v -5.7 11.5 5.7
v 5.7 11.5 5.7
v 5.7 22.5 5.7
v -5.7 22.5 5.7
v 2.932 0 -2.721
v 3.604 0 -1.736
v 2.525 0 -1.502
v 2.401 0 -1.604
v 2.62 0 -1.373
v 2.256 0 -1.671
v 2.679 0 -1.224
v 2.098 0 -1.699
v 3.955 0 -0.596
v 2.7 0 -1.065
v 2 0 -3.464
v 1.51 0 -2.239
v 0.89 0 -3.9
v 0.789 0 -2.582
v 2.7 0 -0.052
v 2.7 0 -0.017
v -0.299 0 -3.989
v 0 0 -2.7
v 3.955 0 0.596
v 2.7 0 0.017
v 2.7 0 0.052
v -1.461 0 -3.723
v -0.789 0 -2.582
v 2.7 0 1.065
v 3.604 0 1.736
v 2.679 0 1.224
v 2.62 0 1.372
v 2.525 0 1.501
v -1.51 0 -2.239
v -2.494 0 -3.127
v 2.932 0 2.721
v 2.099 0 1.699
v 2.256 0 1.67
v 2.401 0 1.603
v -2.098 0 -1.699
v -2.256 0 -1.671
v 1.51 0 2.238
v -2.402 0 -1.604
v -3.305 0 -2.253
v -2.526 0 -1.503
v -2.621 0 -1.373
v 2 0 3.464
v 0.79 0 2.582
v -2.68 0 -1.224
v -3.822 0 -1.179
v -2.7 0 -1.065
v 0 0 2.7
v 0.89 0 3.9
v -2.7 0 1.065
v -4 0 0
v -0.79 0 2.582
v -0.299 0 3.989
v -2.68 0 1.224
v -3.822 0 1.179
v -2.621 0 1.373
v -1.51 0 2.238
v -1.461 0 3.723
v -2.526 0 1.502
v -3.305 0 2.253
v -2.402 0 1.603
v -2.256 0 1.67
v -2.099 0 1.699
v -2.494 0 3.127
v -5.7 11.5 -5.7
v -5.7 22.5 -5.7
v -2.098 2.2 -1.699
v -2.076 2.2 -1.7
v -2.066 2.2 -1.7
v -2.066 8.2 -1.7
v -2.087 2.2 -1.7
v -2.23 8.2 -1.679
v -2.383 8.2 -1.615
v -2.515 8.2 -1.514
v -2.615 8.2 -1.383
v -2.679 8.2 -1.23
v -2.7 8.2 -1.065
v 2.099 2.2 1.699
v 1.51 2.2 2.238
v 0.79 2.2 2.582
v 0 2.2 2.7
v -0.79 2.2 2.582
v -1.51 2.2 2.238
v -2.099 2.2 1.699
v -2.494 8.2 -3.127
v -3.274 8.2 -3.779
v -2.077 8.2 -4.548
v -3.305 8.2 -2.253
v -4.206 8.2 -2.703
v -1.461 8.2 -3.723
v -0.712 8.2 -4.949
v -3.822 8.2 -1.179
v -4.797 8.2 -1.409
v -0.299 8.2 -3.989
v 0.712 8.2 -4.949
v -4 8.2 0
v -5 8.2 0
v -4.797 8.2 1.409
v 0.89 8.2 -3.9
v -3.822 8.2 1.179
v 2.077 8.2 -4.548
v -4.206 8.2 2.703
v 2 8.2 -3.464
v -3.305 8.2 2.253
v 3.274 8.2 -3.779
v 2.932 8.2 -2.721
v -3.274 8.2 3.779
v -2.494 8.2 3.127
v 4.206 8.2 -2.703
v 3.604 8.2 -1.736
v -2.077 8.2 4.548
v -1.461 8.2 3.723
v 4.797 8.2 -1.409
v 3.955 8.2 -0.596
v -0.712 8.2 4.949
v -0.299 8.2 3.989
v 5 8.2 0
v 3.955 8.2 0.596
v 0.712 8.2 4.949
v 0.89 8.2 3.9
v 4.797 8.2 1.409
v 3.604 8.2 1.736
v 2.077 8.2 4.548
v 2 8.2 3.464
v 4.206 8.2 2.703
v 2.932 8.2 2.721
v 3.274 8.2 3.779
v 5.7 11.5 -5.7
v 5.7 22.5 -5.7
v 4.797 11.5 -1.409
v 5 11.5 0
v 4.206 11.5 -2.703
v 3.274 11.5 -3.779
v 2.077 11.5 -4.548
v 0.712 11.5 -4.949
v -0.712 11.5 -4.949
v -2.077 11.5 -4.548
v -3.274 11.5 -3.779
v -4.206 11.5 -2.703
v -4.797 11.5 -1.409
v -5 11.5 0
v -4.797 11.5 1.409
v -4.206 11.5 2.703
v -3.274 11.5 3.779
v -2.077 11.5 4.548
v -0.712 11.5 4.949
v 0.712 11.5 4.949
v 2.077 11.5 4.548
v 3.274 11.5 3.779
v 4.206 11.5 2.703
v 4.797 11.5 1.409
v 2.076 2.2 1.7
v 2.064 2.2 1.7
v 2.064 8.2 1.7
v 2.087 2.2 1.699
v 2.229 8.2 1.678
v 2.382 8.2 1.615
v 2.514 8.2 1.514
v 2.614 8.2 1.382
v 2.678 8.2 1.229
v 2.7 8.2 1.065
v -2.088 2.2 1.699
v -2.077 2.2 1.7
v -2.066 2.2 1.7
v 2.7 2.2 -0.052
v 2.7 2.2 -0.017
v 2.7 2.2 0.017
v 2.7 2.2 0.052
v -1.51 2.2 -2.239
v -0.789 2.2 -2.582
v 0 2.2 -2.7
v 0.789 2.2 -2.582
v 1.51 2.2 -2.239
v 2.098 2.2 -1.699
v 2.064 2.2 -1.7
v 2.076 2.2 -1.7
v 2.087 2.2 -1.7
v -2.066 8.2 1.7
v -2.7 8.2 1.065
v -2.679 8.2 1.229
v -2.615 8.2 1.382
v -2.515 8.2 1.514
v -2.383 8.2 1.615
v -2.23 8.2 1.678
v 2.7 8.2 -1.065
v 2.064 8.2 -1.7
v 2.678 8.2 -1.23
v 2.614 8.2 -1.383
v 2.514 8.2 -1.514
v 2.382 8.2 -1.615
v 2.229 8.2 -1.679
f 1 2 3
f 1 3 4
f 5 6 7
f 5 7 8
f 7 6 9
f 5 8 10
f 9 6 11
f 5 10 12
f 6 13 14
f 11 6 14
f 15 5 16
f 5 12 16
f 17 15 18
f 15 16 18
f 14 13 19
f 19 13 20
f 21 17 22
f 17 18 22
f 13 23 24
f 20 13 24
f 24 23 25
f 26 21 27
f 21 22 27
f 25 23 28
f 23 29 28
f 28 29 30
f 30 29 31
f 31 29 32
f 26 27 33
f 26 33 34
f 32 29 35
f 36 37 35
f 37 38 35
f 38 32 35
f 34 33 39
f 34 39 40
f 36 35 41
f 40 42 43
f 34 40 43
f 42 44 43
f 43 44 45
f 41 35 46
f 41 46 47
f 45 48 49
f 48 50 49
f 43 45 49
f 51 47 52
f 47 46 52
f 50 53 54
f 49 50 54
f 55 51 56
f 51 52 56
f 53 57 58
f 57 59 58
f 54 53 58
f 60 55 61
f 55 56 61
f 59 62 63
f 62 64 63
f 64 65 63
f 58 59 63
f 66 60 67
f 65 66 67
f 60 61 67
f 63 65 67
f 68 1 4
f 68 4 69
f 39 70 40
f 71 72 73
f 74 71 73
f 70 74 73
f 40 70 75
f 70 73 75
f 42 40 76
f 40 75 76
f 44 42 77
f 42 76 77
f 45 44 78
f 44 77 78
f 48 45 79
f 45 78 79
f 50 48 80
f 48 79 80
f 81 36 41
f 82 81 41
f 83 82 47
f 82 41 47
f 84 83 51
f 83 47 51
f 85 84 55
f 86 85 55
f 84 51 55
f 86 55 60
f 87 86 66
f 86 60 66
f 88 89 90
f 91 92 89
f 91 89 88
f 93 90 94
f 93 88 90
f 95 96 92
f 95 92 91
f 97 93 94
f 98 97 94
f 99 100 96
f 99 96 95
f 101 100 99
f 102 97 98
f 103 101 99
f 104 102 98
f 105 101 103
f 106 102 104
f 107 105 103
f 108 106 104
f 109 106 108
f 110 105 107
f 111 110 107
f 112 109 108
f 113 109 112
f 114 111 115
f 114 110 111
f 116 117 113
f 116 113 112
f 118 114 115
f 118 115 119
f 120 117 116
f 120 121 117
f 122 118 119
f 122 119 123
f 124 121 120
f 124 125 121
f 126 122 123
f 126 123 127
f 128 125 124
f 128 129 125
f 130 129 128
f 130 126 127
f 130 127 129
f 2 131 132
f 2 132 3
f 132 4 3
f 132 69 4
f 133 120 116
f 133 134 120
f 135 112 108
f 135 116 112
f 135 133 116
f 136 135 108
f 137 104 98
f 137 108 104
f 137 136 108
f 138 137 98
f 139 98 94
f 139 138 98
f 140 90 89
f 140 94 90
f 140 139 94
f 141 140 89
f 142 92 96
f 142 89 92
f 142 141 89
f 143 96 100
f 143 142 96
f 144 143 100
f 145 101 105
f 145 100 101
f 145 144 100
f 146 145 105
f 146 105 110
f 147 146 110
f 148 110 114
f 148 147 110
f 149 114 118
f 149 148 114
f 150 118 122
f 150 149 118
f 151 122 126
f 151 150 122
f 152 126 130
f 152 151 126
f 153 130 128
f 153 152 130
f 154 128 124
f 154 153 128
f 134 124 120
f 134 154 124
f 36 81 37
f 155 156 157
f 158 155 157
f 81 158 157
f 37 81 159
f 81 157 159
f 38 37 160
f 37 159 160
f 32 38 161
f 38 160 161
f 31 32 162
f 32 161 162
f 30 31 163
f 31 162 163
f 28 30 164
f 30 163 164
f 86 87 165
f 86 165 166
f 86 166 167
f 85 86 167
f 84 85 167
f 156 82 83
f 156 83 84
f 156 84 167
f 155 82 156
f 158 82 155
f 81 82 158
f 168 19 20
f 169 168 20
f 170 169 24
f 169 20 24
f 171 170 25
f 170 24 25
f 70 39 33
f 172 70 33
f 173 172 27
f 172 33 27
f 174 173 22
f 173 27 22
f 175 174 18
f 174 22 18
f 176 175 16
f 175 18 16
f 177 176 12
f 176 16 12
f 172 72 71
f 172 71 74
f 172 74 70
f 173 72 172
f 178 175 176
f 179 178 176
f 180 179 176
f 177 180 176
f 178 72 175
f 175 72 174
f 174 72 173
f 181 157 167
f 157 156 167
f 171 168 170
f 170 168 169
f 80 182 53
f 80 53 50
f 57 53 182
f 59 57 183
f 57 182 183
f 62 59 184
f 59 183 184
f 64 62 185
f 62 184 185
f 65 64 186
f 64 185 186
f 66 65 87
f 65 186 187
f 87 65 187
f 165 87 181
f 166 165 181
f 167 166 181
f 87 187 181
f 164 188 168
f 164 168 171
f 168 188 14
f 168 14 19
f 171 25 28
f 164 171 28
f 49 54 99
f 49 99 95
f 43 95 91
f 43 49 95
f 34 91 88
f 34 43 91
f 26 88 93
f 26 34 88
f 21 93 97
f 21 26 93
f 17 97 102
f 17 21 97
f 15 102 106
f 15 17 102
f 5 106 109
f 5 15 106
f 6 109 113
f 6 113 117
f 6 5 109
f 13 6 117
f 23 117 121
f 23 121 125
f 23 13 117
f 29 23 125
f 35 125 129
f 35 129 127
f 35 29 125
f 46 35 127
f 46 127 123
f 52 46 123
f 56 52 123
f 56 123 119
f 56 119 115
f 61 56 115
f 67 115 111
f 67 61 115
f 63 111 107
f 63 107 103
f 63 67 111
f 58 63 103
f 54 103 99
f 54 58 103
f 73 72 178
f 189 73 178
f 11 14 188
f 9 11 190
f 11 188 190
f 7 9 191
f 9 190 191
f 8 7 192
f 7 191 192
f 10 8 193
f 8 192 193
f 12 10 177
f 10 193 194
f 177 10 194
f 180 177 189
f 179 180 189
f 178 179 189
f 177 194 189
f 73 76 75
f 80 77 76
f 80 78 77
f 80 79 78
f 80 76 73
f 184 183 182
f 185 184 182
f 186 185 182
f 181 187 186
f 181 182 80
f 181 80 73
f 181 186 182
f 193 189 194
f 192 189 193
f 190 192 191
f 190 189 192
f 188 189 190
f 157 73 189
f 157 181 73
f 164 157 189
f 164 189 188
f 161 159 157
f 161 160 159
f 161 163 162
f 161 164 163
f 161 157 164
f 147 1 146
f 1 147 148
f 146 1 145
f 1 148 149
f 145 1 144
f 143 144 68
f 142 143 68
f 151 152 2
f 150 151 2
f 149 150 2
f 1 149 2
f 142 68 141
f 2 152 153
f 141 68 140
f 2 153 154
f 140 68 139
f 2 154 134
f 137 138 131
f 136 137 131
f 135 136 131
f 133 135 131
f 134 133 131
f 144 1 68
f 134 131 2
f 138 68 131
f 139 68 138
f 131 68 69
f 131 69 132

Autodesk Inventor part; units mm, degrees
ref_plane "YZ Plane" through (0, 0, 0) normal (1, 0, 0) x (0, 1, 0)
ref_plane "XZ Plane" through (0, 0, 0) normal (0, 1, 0) x (-1, 0, 0)
ref_plane "XY Plane" through (0, 0, 0) normal (0, 0, 1) x (1, 0, 0)
sketch "Sketch1" plane through (0, 0, 0) normal (0, 1, 0) x (-1, 0, 0)
  line L0 (14.5, -14.5) -> (-14.5, -14.5)
  line L1 (-14.5, -14.5) -> (-14.5, 14.5)
  line L2 (-14.5, 14.5) -> (14.5, 14.5)
  line L3 (14.5, 14.5) -> (14.5, -14.5)
  circle A0 centre (0, 0) radius 4
  dimension "d11" = 29
  dimension "d14" = 29
  dimension "d31" = 8
extrude "Extrusion1" add sketch "Sketch1" along normal blind 11.5 contours A0
sketch "Sketch2" plane through (0, 11.5, 0) normal (0, 1, 0) x (1, 0, 0)
  line L0 (-5.7, 5.7) -> (5.7, 5.7)
  line L1 (5.7, 5.7) -> (5.7, -5.7)
  line L2 (5.7, -5.7) -> (-5.7, -5.7)
  line L3 (-5.7, -5.7) -> (-5.7, 5.7)
  line L4 (14.5, 14.5) -> (-14.5, 14.5) projected
  line L5 (14.5, -14.5) -> (14.5, 14.5) projected
  line L6 (-14.5, -14.5) -> (14.5, -14.5) projected
  line L7 (-14.5, 14.5) -> (-14.5, -14.5) projected
  point P0 (0, 0)
  dimension "d15" = 8.8
  dimension "d16" = 8.8
  dimension "d17" = 8.8
  dimension "d18" = 8.8
  dimension "d32" = 11.4
extrude "Extrusion2" add sketch "Sketch2" along normal blind 11 contours L0 L1 L2 L3
sketch "Sketch3" plane through (0, 0, 0) normal (0, -1, 0) x (1, 0, 0)
  line L0 (-0.0005, -0.0003) -> (-0.0005, -1.7003)
  line L1 (-0.0005, -1.7003) -> (2.6995, -1.7003)
  line L2 (2.6995, -1.7003) -> (2.6995, 1.6997)
  line L3 (2.6995, 1.6997) -> (-2.7005, 1.6997)
  line L4 (-2.7005, 1.6997) -> (-2.7005, -1.7003)
  line L5 (-2.7005, -1.7003) -> (-0.0005, -1.7003)
  dimension "d42" = 1.7
  dimension "d43" = 2.7
  dimension "d44" = 3.4
  dimension "d45" = 5.4
extrude "Extrusion3" cut sketch "Sketch3" against normal blind 8.2
sketch "Sketch5" plane through (0, 0, 0) normal (0, -1, 0) x (1, 0, 0)
  circle A0 centre (0, 0) radius 2.7
  dimension "d35" = 5.4
extrude "Extrusion4" cut sketch "Sketch5" against normal blind 2.2
fillet "Fillet1" radius 0.635 4 edges at (2.6995, 4.1, 1.6997) (2.6995, 4.1, -1.7003) (-2.7005, 4.1, -1.7003) (-2.7005, 4.1, 1.6997)
sketch "Sketch6" plane through (0, 11.5, 0) normal (0, -1, 0) x (1, 0, 0)
  circle A0 centre (0, 0) radius 5
  dimension "d47" = 10
extrude "Extrusion5" add sketch "Sketch6" along normal up to surface (3.3 mm away)
equation "\"d14\" = d11"
equation "\"d16\" = d15"
equation "\"d17\" = d15"
equation "\"d18\" = d15"
equation "\"d42\" = 0.5 * d44"
properties part number "Motor_Key_Bearing_2_2"
